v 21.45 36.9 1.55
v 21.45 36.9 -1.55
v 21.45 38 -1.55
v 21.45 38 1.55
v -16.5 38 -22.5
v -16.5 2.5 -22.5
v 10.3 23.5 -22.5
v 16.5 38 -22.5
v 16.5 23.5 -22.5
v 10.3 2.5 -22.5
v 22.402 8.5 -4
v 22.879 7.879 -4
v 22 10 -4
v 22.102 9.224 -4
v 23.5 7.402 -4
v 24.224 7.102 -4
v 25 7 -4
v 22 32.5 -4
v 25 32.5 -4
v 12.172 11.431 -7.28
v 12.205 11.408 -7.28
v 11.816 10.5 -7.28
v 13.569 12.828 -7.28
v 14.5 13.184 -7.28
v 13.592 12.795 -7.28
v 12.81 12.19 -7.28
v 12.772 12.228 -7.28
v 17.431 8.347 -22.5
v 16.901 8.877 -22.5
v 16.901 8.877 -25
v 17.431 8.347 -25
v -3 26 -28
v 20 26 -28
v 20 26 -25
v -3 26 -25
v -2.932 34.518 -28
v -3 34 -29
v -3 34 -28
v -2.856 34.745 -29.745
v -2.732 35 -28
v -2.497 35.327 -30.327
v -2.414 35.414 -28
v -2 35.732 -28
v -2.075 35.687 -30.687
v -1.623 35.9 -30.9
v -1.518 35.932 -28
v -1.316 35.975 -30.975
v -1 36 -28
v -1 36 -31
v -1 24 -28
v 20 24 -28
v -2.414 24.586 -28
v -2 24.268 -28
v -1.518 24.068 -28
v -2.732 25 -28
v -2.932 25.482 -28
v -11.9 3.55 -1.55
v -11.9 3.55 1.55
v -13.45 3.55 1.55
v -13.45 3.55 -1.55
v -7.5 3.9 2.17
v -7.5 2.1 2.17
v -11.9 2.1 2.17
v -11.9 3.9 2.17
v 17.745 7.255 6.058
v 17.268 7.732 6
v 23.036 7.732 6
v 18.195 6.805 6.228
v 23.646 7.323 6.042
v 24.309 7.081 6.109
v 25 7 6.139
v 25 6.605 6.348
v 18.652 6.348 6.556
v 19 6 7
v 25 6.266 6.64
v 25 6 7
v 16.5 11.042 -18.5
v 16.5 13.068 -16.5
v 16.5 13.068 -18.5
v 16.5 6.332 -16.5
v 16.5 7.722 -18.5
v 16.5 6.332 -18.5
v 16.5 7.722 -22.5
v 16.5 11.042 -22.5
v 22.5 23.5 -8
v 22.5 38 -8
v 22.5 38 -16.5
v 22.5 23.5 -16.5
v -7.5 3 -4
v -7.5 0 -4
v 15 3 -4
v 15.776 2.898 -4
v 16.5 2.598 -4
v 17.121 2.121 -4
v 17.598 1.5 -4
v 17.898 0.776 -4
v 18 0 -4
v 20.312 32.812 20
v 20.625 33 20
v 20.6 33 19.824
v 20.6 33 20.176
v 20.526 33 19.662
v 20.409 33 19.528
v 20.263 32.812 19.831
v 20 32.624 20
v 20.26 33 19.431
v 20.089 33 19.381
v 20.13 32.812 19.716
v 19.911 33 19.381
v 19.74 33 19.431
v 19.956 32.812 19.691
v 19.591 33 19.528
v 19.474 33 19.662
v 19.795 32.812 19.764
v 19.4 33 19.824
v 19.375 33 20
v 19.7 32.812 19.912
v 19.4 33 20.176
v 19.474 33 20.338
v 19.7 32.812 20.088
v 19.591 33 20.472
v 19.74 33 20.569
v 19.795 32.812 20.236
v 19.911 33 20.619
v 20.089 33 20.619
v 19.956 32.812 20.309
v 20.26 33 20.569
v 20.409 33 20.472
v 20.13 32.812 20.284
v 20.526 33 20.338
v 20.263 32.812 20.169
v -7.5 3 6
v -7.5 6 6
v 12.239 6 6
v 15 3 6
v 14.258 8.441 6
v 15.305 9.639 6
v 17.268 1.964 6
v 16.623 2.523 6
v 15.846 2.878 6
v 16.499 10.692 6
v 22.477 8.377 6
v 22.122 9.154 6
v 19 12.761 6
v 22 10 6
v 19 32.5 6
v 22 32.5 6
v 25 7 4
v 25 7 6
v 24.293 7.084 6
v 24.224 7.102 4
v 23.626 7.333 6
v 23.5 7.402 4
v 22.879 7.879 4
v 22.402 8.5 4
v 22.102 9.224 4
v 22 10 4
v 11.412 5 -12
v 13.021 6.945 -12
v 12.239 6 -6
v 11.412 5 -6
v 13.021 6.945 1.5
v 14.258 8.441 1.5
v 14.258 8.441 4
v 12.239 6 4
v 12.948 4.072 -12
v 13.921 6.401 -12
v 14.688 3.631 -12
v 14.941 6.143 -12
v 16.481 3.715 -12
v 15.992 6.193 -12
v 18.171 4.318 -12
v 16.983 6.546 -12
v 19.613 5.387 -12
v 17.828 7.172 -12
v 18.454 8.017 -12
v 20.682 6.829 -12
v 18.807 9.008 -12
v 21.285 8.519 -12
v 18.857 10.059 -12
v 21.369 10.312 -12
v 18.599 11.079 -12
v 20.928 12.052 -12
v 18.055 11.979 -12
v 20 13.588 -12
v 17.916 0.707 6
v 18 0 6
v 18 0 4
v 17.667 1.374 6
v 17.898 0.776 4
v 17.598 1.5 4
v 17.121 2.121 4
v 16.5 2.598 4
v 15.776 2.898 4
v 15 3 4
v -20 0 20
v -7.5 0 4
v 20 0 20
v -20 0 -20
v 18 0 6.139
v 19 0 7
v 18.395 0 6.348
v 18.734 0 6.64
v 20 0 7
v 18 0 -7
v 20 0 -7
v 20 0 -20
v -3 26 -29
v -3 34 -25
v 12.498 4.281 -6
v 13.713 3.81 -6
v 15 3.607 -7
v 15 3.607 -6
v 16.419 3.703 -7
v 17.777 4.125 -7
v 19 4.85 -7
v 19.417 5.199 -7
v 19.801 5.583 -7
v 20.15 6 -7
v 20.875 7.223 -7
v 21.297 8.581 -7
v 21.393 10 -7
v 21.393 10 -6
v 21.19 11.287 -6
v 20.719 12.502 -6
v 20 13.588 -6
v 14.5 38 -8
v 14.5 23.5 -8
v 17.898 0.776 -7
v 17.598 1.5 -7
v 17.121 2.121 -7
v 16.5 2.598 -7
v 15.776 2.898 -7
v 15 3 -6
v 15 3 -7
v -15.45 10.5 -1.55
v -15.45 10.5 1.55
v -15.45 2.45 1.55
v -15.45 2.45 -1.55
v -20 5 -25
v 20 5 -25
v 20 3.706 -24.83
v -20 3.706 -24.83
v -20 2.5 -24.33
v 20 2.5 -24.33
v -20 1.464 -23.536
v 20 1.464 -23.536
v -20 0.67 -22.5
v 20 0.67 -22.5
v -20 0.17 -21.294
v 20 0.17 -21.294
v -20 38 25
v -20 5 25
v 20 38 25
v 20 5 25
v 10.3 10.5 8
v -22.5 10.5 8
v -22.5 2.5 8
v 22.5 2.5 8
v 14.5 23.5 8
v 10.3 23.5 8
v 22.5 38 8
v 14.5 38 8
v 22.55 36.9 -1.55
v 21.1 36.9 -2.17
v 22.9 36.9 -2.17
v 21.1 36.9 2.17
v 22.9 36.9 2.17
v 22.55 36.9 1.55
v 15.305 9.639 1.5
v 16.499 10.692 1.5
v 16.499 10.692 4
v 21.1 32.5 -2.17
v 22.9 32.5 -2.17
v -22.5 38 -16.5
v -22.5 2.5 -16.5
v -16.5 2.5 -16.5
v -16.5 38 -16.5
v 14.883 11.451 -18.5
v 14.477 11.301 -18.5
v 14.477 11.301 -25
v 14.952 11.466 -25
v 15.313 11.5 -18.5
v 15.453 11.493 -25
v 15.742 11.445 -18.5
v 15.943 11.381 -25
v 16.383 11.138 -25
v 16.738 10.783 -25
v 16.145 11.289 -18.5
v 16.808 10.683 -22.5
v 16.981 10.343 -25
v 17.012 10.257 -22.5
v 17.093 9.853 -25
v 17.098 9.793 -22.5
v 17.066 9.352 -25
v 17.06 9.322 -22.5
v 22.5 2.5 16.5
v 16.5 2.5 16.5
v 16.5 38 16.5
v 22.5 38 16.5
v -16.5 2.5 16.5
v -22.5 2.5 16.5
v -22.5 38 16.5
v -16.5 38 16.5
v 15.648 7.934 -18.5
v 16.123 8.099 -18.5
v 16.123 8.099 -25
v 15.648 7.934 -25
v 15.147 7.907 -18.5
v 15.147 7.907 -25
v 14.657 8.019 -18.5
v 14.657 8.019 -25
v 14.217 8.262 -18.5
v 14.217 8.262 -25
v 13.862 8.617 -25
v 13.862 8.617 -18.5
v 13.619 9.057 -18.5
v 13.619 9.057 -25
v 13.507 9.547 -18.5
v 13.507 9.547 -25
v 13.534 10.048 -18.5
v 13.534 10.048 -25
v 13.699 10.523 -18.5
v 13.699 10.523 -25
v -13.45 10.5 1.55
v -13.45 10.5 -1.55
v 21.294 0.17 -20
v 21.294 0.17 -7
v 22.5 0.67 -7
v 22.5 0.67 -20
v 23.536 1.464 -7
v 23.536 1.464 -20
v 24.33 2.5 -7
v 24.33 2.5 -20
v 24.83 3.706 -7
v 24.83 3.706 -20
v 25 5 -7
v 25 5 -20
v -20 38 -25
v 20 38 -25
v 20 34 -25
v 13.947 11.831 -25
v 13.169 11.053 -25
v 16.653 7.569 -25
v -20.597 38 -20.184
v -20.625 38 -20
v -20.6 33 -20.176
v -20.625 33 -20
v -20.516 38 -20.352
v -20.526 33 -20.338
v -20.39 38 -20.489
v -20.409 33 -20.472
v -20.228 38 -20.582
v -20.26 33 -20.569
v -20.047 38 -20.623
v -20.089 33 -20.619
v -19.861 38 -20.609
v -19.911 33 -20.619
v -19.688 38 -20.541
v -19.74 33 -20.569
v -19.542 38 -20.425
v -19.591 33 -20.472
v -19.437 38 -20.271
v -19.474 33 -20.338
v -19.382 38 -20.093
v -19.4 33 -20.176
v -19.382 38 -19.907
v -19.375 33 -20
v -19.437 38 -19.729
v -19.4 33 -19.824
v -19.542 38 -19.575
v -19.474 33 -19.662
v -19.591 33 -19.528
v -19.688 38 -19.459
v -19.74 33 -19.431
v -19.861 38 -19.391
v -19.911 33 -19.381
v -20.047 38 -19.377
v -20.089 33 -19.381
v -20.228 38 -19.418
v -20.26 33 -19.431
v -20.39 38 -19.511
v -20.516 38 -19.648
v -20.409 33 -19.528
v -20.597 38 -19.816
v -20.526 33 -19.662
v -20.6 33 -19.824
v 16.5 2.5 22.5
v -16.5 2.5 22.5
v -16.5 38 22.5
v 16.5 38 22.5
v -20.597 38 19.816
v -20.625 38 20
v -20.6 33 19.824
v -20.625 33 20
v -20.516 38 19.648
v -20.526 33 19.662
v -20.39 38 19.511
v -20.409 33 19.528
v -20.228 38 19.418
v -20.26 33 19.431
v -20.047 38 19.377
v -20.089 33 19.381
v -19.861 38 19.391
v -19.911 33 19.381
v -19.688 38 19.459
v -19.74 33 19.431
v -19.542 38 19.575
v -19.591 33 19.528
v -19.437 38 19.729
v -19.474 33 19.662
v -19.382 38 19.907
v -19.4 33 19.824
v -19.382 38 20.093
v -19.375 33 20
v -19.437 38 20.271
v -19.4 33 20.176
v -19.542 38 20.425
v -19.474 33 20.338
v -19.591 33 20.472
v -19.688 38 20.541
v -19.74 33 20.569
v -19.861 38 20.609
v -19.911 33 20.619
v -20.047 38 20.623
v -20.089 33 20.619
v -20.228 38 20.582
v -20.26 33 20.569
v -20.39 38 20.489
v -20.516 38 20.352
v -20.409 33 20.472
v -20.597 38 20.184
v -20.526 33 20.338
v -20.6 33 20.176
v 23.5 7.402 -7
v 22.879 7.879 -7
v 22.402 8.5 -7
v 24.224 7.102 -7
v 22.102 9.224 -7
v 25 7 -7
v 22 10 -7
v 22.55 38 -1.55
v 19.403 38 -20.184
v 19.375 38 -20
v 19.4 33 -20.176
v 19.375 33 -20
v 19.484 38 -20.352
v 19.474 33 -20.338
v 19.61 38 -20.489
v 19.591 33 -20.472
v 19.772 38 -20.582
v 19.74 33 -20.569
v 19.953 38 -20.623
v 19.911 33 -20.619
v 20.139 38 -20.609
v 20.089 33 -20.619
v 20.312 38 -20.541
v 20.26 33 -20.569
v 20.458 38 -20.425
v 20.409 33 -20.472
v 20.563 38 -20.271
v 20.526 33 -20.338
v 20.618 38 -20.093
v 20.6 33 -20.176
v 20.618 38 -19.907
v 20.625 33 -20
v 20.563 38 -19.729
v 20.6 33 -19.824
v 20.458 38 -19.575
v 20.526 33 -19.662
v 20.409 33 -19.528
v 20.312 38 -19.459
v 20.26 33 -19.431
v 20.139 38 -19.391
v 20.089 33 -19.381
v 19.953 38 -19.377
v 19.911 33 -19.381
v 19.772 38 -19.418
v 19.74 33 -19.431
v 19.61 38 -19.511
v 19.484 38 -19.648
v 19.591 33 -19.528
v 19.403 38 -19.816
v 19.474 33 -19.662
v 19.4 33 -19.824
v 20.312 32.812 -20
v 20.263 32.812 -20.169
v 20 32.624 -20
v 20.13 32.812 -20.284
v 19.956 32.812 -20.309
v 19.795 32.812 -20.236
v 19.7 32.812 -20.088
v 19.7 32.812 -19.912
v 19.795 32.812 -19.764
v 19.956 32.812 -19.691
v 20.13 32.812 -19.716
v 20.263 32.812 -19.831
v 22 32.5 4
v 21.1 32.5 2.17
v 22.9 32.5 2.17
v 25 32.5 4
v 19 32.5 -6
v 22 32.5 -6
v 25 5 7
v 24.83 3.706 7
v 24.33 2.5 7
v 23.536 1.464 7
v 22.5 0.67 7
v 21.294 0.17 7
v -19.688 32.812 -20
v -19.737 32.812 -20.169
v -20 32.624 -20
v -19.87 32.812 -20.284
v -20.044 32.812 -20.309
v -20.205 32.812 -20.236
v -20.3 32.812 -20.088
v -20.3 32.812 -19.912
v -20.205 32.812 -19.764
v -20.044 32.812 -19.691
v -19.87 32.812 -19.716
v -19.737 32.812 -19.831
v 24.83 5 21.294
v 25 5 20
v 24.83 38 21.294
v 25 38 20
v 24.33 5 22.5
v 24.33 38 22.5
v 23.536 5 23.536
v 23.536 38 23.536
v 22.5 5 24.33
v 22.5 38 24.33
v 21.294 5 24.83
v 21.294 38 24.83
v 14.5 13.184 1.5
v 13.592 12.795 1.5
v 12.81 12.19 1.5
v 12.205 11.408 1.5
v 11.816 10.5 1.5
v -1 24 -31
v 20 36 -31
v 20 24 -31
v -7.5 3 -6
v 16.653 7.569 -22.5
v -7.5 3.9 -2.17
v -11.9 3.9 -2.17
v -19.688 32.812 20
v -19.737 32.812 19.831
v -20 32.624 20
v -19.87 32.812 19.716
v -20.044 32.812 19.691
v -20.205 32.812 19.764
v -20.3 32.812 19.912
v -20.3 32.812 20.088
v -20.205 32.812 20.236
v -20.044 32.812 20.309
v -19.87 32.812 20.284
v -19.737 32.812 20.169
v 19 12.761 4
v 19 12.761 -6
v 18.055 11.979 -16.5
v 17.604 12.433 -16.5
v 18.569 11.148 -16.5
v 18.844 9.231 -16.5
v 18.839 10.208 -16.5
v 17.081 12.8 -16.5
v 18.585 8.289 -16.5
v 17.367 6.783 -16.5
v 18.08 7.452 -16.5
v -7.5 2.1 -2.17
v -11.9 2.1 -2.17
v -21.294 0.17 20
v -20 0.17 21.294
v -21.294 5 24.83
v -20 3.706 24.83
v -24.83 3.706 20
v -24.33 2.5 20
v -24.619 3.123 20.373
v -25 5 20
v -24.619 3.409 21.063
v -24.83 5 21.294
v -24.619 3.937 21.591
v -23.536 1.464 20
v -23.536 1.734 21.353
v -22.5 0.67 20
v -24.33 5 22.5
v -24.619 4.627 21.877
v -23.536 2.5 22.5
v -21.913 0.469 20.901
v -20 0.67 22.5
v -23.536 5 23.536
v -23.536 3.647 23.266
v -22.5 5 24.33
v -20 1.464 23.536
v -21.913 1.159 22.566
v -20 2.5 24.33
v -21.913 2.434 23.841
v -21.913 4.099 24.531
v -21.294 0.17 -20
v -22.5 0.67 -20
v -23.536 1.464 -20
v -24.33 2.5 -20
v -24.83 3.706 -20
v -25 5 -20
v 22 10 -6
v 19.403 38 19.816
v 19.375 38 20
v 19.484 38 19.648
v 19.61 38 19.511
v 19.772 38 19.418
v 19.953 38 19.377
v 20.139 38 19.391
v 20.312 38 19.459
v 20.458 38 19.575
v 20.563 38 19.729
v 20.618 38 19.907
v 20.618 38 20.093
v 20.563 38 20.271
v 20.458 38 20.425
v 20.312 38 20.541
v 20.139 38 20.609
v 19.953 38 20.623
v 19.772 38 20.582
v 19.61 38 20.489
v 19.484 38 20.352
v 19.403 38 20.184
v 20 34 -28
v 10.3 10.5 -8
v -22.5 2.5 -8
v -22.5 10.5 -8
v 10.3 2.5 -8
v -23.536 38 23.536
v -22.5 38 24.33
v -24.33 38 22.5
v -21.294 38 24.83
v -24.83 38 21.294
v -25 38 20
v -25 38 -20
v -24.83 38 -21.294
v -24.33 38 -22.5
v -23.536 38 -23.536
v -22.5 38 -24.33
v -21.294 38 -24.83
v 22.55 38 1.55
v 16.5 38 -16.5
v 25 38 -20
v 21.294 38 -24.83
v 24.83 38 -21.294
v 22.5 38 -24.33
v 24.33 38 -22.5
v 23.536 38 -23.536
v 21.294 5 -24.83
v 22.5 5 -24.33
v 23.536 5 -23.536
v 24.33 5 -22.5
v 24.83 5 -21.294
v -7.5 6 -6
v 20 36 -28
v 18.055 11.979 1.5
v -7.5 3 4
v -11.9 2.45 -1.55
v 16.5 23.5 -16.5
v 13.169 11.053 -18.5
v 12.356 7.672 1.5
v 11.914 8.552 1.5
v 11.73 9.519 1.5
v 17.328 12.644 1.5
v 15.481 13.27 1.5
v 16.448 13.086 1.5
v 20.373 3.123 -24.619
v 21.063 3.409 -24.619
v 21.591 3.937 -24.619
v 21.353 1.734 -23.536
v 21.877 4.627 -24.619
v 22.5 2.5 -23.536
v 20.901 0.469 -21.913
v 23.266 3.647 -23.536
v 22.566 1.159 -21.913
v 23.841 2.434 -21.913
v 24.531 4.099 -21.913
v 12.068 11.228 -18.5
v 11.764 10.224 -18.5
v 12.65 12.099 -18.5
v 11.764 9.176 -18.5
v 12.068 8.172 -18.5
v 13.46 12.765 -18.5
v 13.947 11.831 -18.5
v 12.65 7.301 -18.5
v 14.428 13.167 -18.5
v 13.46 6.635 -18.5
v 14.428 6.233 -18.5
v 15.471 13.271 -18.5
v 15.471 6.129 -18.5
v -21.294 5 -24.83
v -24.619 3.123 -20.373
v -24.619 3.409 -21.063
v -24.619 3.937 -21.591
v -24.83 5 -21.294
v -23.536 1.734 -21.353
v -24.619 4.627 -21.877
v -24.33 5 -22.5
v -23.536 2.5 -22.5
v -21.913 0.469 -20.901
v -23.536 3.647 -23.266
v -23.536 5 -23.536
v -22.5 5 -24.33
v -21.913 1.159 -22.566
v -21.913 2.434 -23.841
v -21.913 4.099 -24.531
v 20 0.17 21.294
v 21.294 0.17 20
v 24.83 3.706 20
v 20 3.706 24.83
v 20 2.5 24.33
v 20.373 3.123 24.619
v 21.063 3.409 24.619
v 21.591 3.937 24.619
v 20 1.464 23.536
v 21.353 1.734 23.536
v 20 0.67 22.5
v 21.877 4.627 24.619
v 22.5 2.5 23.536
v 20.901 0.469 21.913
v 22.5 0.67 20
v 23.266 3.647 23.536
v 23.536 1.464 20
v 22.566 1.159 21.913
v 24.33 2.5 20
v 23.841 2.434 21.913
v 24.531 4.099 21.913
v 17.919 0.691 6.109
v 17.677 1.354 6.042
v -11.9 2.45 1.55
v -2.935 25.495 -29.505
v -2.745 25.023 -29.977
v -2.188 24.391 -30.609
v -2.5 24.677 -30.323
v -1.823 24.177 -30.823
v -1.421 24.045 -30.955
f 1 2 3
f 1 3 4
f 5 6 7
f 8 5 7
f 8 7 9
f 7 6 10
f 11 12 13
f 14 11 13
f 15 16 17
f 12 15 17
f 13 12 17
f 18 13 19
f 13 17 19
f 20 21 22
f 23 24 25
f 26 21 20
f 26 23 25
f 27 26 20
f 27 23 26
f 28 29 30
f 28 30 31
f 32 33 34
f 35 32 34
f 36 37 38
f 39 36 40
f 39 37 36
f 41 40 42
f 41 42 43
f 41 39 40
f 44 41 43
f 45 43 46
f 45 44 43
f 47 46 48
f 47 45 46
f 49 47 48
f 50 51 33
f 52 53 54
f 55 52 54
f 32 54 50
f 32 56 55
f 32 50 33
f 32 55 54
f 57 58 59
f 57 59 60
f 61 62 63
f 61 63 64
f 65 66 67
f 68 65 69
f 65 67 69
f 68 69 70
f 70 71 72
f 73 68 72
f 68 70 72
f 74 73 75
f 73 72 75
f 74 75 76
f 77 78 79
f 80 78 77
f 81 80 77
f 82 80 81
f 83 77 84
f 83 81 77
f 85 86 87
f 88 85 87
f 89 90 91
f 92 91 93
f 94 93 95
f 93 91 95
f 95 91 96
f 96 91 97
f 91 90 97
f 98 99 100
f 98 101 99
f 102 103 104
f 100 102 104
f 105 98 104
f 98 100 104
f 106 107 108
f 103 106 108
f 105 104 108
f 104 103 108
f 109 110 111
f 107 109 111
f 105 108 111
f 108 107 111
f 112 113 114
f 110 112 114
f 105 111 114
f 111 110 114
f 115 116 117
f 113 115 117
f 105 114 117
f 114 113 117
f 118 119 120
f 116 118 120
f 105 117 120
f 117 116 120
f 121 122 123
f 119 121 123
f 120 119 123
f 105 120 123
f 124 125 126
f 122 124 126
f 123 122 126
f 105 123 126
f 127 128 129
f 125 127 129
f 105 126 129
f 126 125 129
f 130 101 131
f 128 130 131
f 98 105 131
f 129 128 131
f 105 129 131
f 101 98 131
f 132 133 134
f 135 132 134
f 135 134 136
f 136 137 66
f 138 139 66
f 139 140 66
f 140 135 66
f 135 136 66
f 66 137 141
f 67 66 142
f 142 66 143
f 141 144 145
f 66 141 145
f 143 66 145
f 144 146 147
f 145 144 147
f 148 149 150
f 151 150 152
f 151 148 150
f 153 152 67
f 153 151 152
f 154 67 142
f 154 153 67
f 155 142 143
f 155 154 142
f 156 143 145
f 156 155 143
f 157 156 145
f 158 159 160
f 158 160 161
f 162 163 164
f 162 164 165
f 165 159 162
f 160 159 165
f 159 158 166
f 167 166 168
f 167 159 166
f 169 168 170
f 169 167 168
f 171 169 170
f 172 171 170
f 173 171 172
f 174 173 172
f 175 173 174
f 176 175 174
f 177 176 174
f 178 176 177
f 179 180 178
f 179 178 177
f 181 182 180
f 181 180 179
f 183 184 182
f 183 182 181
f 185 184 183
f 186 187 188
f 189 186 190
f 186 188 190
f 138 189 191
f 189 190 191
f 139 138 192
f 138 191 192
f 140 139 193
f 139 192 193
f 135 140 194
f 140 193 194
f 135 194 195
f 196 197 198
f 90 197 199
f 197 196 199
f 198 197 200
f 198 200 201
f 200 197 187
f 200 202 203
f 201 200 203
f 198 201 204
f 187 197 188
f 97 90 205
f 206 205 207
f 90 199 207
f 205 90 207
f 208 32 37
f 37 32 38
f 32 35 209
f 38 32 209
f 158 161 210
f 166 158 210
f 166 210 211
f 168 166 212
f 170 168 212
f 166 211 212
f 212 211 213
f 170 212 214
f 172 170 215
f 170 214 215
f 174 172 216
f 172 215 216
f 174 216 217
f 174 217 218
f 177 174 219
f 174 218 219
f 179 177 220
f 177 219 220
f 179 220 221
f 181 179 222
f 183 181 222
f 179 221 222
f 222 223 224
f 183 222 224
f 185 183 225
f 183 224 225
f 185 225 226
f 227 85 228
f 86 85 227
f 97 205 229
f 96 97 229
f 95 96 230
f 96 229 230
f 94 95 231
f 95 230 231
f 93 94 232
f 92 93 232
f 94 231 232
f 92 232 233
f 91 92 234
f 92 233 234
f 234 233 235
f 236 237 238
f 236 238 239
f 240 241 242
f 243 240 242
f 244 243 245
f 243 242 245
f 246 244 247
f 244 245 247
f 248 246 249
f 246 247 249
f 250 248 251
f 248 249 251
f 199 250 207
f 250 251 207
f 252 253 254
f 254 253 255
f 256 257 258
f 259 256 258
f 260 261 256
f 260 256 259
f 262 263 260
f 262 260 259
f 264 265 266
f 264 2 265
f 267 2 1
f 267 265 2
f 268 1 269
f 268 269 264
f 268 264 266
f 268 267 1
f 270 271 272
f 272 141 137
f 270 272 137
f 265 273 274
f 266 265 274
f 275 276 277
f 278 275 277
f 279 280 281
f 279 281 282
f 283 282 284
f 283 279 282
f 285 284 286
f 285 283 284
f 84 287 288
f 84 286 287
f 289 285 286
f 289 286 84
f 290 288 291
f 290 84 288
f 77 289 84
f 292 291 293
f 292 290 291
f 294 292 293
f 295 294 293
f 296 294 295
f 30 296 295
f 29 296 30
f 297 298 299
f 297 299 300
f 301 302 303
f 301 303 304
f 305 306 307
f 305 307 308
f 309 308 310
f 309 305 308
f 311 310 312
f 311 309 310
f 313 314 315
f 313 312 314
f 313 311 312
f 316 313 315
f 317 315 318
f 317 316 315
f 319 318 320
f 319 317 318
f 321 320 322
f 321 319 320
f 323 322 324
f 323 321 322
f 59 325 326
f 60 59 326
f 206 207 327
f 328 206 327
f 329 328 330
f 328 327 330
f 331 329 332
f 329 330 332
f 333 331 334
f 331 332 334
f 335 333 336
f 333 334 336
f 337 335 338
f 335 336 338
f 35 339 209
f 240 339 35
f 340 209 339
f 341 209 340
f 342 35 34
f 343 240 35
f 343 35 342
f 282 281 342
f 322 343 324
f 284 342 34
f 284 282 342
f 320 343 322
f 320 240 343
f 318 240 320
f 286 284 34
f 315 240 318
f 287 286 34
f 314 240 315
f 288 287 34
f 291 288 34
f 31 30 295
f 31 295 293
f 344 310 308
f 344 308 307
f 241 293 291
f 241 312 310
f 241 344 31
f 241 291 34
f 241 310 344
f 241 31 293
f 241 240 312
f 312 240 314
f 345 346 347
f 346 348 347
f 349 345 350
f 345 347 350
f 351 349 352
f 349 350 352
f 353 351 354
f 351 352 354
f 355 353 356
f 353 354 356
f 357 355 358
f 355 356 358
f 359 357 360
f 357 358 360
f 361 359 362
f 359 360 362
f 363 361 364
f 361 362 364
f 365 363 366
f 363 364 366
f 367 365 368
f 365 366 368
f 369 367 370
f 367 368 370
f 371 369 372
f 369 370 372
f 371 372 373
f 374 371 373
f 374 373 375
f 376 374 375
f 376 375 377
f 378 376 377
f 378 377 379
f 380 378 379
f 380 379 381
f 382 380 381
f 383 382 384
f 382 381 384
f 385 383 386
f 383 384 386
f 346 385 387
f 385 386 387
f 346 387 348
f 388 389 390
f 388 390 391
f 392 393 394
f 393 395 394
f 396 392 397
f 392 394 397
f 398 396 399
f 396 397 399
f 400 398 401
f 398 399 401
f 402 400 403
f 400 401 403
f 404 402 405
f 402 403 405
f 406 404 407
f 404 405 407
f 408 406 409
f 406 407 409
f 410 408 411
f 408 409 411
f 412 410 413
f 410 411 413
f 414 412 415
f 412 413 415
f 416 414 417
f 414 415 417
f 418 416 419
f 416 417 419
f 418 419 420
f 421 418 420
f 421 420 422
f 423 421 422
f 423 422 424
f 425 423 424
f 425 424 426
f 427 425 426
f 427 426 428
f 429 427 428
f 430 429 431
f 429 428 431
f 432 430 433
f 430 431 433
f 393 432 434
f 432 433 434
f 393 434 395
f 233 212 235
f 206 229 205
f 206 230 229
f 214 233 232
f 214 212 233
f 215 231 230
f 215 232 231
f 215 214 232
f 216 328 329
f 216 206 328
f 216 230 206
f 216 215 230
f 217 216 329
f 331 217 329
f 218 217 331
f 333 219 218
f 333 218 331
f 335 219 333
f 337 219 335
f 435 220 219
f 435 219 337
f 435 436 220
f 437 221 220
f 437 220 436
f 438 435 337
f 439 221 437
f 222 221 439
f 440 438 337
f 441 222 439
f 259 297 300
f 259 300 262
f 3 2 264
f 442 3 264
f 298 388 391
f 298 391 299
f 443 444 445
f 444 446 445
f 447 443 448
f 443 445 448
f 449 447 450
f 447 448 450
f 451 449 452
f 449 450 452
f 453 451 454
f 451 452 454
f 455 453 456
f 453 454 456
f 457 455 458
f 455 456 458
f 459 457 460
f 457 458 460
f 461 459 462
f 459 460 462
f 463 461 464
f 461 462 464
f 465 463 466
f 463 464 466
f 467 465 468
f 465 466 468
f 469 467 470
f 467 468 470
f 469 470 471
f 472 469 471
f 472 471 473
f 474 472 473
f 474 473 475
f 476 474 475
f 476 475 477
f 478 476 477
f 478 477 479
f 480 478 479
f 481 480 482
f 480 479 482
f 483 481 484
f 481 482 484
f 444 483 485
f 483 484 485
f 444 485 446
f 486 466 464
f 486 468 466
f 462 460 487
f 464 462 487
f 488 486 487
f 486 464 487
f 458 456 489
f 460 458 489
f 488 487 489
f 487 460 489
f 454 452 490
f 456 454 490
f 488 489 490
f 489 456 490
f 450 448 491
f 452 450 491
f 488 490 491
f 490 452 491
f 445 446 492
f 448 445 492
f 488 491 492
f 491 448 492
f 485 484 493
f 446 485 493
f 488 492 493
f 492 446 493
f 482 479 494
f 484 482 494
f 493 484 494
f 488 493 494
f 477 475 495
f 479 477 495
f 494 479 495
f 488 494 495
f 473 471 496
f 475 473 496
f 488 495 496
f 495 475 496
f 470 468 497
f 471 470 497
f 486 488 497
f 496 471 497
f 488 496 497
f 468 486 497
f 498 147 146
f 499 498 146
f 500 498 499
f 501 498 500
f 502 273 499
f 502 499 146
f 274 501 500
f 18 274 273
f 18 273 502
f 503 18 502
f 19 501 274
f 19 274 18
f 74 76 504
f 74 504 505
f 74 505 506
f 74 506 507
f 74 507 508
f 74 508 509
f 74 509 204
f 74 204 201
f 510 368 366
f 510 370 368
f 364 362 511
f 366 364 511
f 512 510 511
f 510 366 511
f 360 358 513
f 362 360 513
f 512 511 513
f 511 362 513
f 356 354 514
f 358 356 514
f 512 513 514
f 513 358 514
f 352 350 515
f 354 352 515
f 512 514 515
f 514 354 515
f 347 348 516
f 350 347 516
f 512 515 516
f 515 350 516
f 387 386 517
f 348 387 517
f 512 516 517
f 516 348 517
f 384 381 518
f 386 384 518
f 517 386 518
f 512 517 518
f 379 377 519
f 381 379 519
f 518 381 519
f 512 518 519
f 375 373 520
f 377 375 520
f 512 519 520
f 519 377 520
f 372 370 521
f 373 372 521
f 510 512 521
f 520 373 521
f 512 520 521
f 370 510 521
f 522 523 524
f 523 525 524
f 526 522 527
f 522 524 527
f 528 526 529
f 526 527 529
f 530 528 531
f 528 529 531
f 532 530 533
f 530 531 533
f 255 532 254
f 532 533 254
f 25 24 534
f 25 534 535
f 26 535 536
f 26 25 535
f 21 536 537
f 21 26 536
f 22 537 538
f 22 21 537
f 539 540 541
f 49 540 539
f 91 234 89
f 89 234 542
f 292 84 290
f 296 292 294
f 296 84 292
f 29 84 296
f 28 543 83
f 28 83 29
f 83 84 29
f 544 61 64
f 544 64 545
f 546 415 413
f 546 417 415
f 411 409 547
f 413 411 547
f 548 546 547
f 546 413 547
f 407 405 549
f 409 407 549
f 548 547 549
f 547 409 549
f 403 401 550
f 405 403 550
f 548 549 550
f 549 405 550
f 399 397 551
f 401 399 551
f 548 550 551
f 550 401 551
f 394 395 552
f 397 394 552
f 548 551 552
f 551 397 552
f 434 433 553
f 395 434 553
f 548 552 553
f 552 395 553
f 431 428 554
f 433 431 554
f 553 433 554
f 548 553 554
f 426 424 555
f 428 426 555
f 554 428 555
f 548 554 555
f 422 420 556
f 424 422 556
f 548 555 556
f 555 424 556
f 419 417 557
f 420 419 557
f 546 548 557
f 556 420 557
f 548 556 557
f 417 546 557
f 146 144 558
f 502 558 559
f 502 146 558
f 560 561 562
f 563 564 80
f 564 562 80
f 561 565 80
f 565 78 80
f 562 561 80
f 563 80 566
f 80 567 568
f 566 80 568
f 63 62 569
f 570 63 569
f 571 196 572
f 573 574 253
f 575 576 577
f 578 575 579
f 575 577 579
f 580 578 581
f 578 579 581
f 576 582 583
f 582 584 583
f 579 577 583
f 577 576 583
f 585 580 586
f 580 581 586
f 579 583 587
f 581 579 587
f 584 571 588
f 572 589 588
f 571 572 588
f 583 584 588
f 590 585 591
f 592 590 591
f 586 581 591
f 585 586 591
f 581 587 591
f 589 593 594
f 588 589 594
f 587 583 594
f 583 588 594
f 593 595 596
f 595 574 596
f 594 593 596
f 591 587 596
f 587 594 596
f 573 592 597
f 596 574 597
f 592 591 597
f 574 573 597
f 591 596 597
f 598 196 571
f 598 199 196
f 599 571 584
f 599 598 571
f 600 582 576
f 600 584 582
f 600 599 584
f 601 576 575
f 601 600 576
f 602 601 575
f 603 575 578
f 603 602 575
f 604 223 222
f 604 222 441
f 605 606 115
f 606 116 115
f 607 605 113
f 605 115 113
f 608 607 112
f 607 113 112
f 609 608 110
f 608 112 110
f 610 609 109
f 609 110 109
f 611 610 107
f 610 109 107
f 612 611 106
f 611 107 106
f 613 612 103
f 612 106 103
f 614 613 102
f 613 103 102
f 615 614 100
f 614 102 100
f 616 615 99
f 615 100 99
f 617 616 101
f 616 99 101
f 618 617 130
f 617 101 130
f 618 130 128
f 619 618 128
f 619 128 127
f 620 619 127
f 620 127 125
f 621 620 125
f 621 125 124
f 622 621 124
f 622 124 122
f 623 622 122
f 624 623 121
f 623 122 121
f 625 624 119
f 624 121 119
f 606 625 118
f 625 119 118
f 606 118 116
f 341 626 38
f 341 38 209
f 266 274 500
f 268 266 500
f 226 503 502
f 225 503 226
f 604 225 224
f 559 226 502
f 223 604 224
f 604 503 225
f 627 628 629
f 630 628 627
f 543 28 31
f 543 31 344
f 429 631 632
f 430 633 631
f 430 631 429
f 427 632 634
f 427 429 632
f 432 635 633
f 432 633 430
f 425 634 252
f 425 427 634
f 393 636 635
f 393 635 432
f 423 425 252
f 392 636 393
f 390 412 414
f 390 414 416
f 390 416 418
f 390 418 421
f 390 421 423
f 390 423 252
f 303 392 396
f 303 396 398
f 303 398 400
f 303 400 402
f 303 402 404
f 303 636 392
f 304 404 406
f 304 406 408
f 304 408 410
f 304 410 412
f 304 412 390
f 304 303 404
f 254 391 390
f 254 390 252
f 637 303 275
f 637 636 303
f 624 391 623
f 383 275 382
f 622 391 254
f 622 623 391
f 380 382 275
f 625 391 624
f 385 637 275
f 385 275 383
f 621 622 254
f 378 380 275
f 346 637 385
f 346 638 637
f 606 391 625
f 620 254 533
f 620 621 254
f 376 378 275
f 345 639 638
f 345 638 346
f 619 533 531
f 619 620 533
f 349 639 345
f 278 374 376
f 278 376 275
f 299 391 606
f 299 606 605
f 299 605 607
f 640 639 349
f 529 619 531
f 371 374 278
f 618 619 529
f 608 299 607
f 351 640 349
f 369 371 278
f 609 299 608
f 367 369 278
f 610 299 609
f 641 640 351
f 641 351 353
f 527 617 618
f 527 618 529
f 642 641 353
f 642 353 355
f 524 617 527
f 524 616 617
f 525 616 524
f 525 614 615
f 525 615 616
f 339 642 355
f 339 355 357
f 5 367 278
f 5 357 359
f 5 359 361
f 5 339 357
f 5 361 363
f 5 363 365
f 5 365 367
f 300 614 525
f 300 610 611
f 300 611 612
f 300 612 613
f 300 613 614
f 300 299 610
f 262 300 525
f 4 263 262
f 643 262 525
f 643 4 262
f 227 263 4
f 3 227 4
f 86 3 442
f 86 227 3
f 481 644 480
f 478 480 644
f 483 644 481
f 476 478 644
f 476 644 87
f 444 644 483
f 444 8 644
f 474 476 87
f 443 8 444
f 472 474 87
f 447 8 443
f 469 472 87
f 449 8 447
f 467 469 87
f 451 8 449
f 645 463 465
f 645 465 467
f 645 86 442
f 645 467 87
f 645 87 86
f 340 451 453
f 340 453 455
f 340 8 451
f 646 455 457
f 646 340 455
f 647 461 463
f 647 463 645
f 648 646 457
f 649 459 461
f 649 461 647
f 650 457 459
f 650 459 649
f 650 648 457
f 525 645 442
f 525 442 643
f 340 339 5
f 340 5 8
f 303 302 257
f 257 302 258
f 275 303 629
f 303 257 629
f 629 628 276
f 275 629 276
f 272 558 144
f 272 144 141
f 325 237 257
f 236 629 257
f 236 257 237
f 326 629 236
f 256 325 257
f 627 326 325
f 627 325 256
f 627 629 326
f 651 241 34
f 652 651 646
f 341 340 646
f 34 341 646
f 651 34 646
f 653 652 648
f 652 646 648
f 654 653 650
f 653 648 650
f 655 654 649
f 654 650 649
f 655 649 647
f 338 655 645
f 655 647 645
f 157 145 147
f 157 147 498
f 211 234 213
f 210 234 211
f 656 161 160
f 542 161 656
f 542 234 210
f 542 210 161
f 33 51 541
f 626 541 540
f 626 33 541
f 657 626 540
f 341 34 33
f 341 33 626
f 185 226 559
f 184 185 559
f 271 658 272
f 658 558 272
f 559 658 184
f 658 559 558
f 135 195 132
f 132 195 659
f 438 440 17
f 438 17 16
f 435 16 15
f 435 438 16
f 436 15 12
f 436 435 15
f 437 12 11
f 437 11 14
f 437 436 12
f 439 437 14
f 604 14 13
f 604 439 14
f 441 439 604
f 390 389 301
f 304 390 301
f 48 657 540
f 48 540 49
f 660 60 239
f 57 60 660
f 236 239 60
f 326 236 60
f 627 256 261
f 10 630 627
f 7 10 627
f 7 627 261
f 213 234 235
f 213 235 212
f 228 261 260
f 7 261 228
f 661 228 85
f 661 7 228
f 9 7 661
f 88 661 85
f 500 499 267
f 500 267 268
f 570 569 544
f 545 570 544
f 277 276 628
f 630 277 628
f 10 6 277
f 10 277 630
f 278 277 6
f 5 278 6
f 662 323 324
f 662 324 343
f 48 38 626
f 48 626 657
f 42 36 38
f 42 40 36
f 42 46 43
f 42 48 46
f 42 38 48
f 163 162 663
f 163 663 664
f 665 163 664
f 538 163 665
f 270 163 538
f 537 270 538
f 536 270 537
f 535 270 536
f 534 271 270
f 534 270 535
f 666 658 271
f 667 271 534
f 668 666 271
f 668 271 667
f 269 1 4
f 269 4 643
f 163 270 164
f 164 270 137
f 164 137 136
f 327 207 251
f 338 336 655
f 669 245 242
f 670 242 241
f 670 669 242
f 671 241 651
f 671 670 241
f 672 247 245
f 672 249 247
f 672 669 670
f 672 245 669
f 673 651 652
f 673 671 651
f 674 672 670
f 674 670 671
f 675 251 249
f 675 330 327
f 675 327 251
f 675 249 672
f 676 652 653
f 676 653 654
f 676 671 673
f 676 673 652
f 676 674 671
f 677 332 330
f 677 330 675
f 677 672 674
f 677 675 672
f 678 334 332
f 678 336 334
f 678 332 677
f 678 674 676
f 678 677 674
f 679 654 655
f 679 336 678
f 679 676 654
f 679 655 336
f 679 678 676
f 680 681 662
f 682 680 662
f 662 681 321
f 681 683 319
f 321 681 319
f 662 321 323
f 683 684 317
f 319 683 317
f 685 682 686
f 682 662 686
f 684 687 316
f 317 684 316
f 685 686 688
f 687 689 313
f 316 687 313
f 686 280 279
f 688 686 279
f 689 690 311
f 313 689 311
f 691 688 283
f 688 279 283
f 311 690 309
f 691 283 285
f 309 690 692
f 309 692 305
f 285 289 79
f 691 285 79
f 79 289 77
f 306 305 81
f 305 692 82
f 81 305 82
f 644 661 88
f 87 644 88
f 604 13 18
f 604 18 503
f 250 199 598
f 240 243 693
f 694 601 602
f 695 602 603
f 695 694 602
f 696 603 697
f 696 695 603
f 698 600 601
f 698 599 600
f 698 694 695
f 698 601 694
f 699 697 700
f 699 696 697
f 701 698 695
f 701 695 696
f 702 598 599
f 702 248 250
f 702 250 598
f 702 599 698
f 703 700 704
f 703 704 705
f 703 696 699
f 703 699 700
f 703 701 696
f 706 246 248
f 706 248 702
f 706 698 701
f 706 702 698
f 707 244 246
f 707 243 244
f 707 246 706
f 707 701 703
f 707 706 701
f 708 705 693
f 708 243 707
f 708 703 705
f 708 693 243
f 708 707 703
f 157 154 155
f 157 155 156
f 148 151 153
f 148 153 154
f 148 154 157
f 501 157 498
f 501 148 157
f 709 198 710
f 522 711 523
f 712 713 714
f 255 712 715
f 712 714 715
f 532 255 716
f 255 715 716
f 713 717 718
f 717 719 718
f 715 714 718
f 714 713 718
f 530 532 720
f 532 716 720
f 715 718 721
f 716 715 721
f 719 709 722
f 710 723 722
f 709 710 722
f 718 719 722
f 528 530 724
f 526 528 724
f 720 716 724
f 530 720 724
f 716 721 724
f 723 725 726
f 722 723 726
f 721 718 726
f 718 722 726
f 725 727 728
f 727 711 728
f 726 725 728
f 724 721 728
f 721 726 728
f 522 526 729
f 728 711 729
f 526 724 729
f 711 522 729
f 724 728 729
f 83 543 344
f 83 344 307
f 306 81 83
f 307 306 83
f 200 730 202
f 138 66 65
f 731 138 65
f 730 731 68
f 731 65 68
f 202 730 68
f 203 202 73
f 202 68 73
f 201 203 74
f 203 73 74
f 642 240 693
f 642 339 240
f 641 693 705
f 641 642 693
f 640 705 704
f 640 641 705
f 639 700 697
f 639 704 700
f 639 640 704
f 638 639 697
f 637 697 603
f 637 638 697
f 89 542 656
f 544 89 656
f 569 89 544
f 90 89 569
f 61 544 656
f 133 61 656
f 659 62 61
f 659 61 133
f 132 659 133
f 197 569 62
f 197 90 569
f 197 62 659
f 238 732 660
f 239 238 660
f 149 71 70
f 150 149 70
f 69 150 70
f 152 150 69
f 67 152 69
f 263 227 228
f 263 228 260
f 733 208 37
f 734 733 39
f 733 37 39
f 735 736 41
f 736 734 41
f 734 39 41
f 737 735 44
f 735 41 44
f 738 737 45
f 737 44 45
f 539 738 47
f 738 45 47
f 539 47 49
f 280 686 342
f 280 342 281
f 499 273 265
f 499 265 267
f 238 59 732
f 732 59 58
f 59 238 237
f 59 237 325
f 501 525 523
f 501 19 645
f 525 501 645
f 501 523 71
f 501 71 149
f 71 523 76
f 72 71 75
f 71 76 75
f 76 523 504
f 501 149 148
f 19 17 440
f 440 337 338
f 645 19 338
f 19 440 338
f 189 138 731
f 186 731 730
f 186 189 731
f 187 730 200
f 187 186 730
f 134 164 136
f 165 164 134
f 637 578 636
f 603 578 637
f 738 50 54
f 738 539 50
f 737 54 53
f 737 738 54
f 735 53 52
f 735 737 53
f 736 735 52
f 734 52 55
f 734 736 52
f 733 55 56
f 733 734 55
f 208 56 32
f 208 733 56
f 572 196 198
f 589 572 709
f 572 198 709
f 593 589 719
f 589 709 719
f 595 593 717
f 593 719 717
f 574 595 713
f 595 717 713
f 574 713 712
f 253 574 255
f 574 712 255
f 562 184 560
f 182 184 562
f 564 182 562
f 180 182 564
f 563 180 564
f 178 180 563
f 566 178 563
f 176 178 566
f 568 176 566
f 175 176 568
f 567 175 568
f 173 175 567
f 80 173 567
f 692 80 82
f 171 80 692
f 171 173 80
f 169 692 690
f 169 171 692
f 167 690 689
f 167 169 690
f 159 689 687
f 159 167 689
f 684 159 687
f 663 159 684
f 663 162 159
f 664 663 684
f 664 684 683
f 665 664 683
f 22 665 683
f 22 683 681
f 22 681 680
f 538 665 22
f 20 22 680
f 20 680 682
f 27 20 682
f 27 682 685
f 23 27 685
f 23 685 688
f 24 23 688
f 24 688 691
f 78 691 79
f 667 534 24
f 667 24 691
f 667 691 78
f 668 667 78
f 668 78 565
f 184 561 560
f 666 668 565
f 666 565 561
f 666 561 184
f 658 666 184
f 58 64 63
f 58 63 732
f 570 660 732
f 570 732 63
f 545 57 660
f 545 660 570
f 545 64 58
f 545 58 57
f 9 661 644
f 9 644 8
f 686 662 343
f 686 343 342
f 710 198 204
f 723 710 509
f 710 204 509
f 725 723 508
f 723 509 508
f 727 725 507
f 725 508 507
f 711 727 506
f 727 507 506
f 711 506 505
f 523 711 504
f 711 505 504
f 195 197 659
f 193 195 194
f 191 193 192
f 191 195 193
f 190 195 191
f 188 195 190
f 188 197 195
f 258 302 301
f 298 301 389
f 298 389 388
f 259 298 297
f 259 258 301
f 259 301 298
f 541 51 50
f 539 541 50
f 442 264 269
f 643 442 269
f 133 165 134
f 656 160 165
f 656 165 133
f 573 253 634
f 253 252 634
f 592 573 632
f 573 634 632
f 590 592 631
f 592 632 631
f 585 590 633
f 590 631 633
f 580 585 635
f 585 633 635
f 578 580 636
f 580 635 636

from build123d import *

# Parameters (mm, degrees)
SKETCH1_W                = 50
SKETCH1_H                = 50
BOSS_EXTRUDE1_DEPTH      = 38
SHELL1_T                 = -2.5
BOSS_EXTRUDE2_DEPTH      = 21
SKETCH3_W                = 45
SKETCH3_H                = 16
BOSS_EXTRUDE3_DEPTH      = 8
SKETCH4_W                = 32.5
SKETCH4_H                = 8
CUT_EXTRUDE1_DEPTH       = 3
SKETCH7_W                = 32.5
SKETCH7_H                = 12
CUT_EXTRUDE2_DEPTH       = 3
SKETCH8_W                = 16
SKETCH8_H                = 27.5
BOSS_EXTRUDE4_DEPTH      = 8
SKETCH9_W                = 8
SKETCH9_H                = 32.5
CUT_EXTRUDE3_DEPTH       = 3
CUT_EXTRUDE5_DEPTH       = 3
CUT_EXTRUDE7_DEPTH       = 10
CUT_EXTRUDE7_DEPTH_BACK  = 2
SKETCH13_W               = 3
SKETCH13_H               = 3.011524732
FILLET1_R                = 5
SKETCH16_R               = 1.8
CUT_EXTRUDE8_DEPTH       = 53.642663306
SKETCH17_W               = 23
SKETCH17_H               = 12
BOSS_EXTRUDE5_DEPTH      = 6
SKETCH18_W               = 3
SKETCH18_H               = 2
CUT_EXTRUDE9_DEPTH       = 57.471231614
CUT_EXTRUDE12_DEPTH      = 2
CUT_EXTRUDE13_DEPTH      = 2
CUT_EXTRUDE14_DEPTH      = 16
CUT_EXTRUDE10_START      = -19.5
CUT_EXTRUDE10_DEPTH      = 19.5
FILLET4_R                = 2
CUT_EXTRUDE18_DEPTH      = 13
CUT_EXTRUDE18_DEPTH_BACK = 1
SKETCH26_W               = 6
SKETCH26_H               = 6
BOSS_EXTRUDE6_DEPTH      = 4.5
SKETCH30_W               = 4.34
SKETCH30_H               = 1.8
CUT_EXTRUDE19_DEPTH      = 4.4
SKETCH31_W               = 1.8
SKETCH31_H               = 4.34
CUT_EXTRUDE20_DEPTH      = 4.4
SKETCH32_W               = 1.1
SKETCH32_H               = 3.1
CUT_EXTRUDE21_DEPTH      = 55.291896265
SKETCH33_W               = 3.1
SKETCH33_H               = 1.1
CUT_EXTRUDE22_DEPTH      = 3.55
SKETCH34_W               = 2
SKETCH34_H               = 3.1
CUT_EXTRUDE23_DEPTH      = 7.3
SKETCH45_R               = 3.575
CUT_EXTRUDE27_DEPTH      = 20
SKETCH46_W               = 1.850257739
SKETCH46_H               = 4
SKETCH46_W_2             = 4
SKETCH46_H_2             = 1.850257739
CUT_EXTRUDE28_DEPTH      = 1
CUT_EXTRUDE25_START      = -3
CUT_EXTRUDE25_DEPTH      = 3
CUT_EXTRUDE24_START      = -3
CUT_EXTRUDE24_DEPTH      = 3
CUT_EXTRUDE29_DEPTH      = 2
FILLET8_R                = 2
BOSS_EXTRUDE9_DEPTH      = 8.78
SKETCH49_W               = 4.2
SKETCH49_H               = 13
BOSS_EXTRUDE10_DEPTH     = 6.5
SKETCH50_W               = 6
SKETCH50_H               = 6
BOSS_EXTRUDE11_DEPTH     = 35.5
M1_6_TAPPED_HOLE1_D      = 1.25
M1_6_TAPPED_HOLE1_DEPTH  = 5
M1_6_TAPPED_HOLE1_TIP    = 0.375537887


with BuildPart() as part:
    # Sketch1 → Boss-Extrude1 (new body)
    with BuildSketch(Plane(origin=(0, 0, 0), x_dir=(1, 0, 0), z_dir=(0, 1, 0))):
        Rectangle(SKETCH1_W, SKETCH1_H)
    extrude(amount=BOSS_EXTRUDE1_DEPTH)

    # Shell1
    shell1_openings = [part.faces().sort_by_distance(p)[0] for p in [
        (0, 38, 0),
    ]]
    offset(amount=SHELL1_T, openings=shell1_openings, kind=Kind.INTERSECTION)

    # Sketch2 → Boss-Extrude2 (add)
    with BuildSketch(Plane(origin=(0, 2.5, 0), x_dir=(1, 0, 0), z_dir=(0, 1, 0))):
        Polygon((10.3, 22.5), (10.3, 13.5), (10.3, 7.28), (22.5, 7.28), (22.5, 22.5), align=None)
    extrude(amount=BOSS_EXTRUDE2_DEPTH)

    # Sketch3 → Boss-Extrude3 (add)
    with BuildSketch(Plane(origin=(0, 2.5, 0), x_dir=(1, 0, 0), z_dir=(0, 1, 0))):
        Rectangle(SKETCH3_W, SKETCH3_H)
    extrude(amount=BOSS_EXTRUDE3_DEPTH)

    # Sketch4 → Cut-Extrude1 (cut)
    with BuildSketch(Plane.XZ):
        with Locations((8.75, 0)):
            Rectangle(SKETCH4_W, SKETCH4_H)
    extrude(amount=-CUT_EXTRUDE1_DEPTH, mode=Mode.SUBTRACT)

    # Sketch7 → Cut-Extrude2 (cut)
    with BuildSketch(Plane(origin=(0, 3, 0), x_dir=(-1, 0, 0), z_dir=(0, -1, 0))):
        with Locations((-8.75, 0)):
            Rectangle(SKETCH7_W, SKETCH7_H)
    extrude(amount=-CUT_EXTRUDE2_DEPTH, mode=Mode.SUBTRACT)

    # Sketch8 → Boss-Extrude4 (add)
    with BuildSketch(Plane.ZY.offset(-22.5)):
        with Locations((0, 24.25)):
            Rectangle(SKETCH8_W, SKETCH8_H)
    extrude(amount=BOSS_EXTRUDE4_DEPTH)

    # Sketch9 → Cut-Extrude3 (cut)
    with BuildSketch(Plane(origin=(25, 0, 0), x_dir=(0, 0, -1), z_dir=(1, 0, 0))):
        with Locations((0, 16.25)):
            Rectangle(SKETCH9_W, SKETCH9_H)
    extrude(amount=-CUT_EXTRUDE3_DEPTH, mode=Mode.SUBTRACT)

    # Sketch10 → Cut-Extrude5 (cut)
    with BuildSketch(Plane(origin=(22, 0, 0), x_dir=(0, 0, -1), z_dir=(1, 0, 0))):
        Polygon((-6, 32.5), (-6, 0), (6, 0), (6, 3), (6, 32.5), align=None)
    extrude(amount=-CUT_EXTRUDE5_DEPTH, mode=Mode.SUBTRACT)

    # Sketch13 → Cut-Extrude7 (cut, two sides: drawn at the far end of the back side and taken through both)
    with BuildSketch(Plane(origin=(0, 0, 4), x_dir=(-1, 0, 0), z_dir=(0, 0, -1)).offset(-CUT_EXTRUDE7_DEPTH_BACK)):
        with Locations((-23.5, 1.505762366)):
            Rectangle(SKETCH13_W, SKETCH13_H)
    extrude(amount=CUT_EXTRUDE7_DEPTH + CUT_EXTRUDE7_DEPTH_BACK, mode=Mode.SUBTRACT)

    # Fillet1
    fillet1_edges = [part.edges().sort_by_distance(p)[0] for p in [
        (25, 0, -15.5),
        (0, 0, -25),
        (25, 0, 15.5),
        (0, 0, 25),
        (-25, 0, 0),
        (-25, 19, -25),
        (25, 19, -25),
        (25, 19, 25),
        (-25, 19, 25),
    ]]
    fillet(fillet1_edges, radius=FILLET1_R)

    # Sketch16 → Cut-Extrude8 (cut, through all)
    with BuildSketch(Plane(origin=(0, 0, 1.5), x_dir=(-1, 0, 0), z_dir=(0, 0, -1))):
        with Locations(Location((-15.3, 9.7, 0), (0, 0, 63.612200039))):
            Circle(SKETCH16_R)
    extrude(amount=CUT_EXTRUDE8_DEPTH, mode=Mode.SUBTRACT)

    # Sketch17 → Boss-Extrude5 (add)
    with BuildSketch(Plane(origin=(0, 0, -25), x_dir=(-1, 0, 0), z_dir=(0, 0, -1))):
        with Locations((-8.5, 30)):
            Rectangle(SKETCH17_W, SKETCH17_H)
    extrude(amount=BOSS_EXTRUDE5_DEPTH)

    # Sketch18 → Cut-Extrude9 (cut, through all)
    with BuildSketch(Plane.ZY.offset(3)):
        with Locations((-26.5, 25)):
            Rectangle(SKETCH18_W, SKETCH18_H)
        with Locations((-26.5, 35)):
            Rectangle(SKETCH18_W, SKETCH18_H)
    extrude(amount=-CUT_EXTRUDE9_DEPTH, mode=Mode.SUBTRACT)

    # Sketch20 → Cut-Extrude12 (cut)
    with BuildSketch(Plane(origin=(0, 0, 4), x_dir=(-1, 0, 0), z_dir=(0, 0, -1))):
        with BuildLine():
            Line((-22, 10), (-22, 7))
            Line((-22, 7), (-22, 6))
            Line((-22, 6), (-24, 6))
            Line((-24, 6), (-25, 6))
            Line((-25, 6), (-25, 7))
            ThreePointArc((-25, 7), (-22.878679656, 7.878679656), (-22, 10))
        make_face()
    extrude(amount=-CUT_EXTRUDE12_DEPTH, mode=Mode.SUBTRACT)

    # Sketch21 → Cut-Extrude13 (cut)
    with BuildSketch(Plane(origin=(0, 0, 4), x_dir=(-1, 0, 0), z_dir=(0, 0, -1))):
        with BuildLine():
            Line((-19, 3), (-19, 0))
            Line((-19, 0), (-18, 0))
            ThreePointArc((-18, 0), (-17.121320344, 2.121320344), (-15, 3))
            Line((-15, 3), (-19, 3))
        make_face()
    extrude(amount=-CUT_EXTRUDE13_DEPTH, mode=Mode.SUBTRACT)

    # Sketch22 → Cut-Extrude14 (cut)
    with BuildSketch(Plane(origin=(0, 0, 4), x_dir=(-1, 0, 0), z_dir=(0, 0, -1))):
        with BuildLine():
            Line((-15.3, 9.7), (-11.411555581, 5))
            ThreePointArc((-11.411555581, 5), (-19.613351365, 5.386648635), (-20, 13.588444419))
            Line((-20, 13.588444419), (-15.3, 9.7))
        make_face()
    extrude(amount=CUT_EXTRUDE14_DEPTH, mode=Mode.SUBTRACT)

    # Sketch19 → Cut-Extrude10 (cut)
    with BuildSketch(Plane(origin=(0, 0, -25), x_dir=(-1, 0, 0), z_dir=(0, 0, -1)).offset(CUT_EXTRUDE10_START)):
        with BuildLine():
            ThreePointArc((-16.123011235, 8.099171306), (-16.572792206, 8.427207794), (-16.900828694, 8.876988765))
            Line((-16.900828694, 8.876988765), (-17.43115878, 8.346658679))
            Line((-17.43115878, 8.346658679), (-16.653341321, 7.56884122))
            Line((-16.653341321, 7.56884122), (-16.123011235, 8.099171306))
        make_face()
        with BuildLine():
            ThreePointArc((-14.476988765, 11.300828694), (-14.027207794, 10.972792206), (-13.699171306, 10.523011235))
            Line((-13.699171306, 10.523011235), (-13.16884122, 11.053341321))
            Line((-13.16884122, 11.053341321), (-13.946658679, 11.83115878))
            Line((-13.946658679, 11.83115878), (-14.476988765, 11.300828694))
        make_face()
    extrude(amount=CUT_EXTRUDE10_DEPTH, mode=Mode.SUBTRACT)

    # Fillet4
    fillet4_edges = [part.edges().sort_by_distance(p)[0] for p in [
        (-3, 36, -29.5),
        (-3, 24, -29.5),
        (-3, 30, -31),
    ]]
    fillet(fillet4_edges, radius=FILLET4_R)

    # Sketch26 → Cut-Extrude18 (cut, two sides: drawn at the far end of the back side and taken through both)
    with BuildSketch(Plane(origin=(0, 0, 6), x_dir=(-1, 0, 0), z_dir=(0, 0, -1)).offset(-CUT_EXTRUDE18_DEPTH_BACK)):
        with Locations((-22, 3)):
            Rectangle(SKETCH26_W, SKETCH26_H)
    extrude(amount=CUT_EXTRUDE18_DEPTH + CUT_EXTRUDE18_DEPTH_BACK, mode=Mode.SUBTRACT)

    # Sketch29 → Boss-Extrude6 (add)
    with BuildSketch(Plane(origin=(0, 0, 6), x_dir=(-1, 0, 0), z_dir=(0, 0, -1))):
        with BuildLine():
            Line((-16.499079266, 10.69203257), (-15.305377807, 9.639286837))
            Line((-15.305377807, 9.639286837), (-14.258167132, 8.440726637))
            ThreePointArc((-14.258167132, 8.440726637), (-14.177344347, 10.762112408), (-16.499079266, 10.69203257))
        make_face()
    extrude(amount=BOSS_EXTRUDE6_DEPTH)

    # Sketch30 → Cut-Extrude19 (cut)
    with BuildSketch(Plane(origin=(-7.5, 0, 0), x_dir=(0, 0, -1), z_dir=(1, 0, 0))):
        with Locations((0, 3)):
            Rectangle(SKETCH30_W, SKETCH30_H)
    extrude(amount=-CUT_EXTRUDE19_DEPTH, mode=Mode.SUBTRACT)

    # Sketch31 → Cut-Extrude20 (cut)
    with BuildSketch(Plane.XZ.offset(-32.5)):
        with Locations((22, 0)):
            Rectangle(SKETCH31_W, SKETCH31_H)
    extrude(amount=-CUT_EXTRUDE20_DEPTH, mode=Mode.SUBTRACT)

    # Sketch32 → Cut-Extrude21 (cut, through all)
    with BuildSketch(Plane.XZ.offset(-36.9)):
        with Locations((22, 0)):
            Rectangle(SKETCH32_W, SKETCH32_H)
    extrude(amount=-CUT_EXTRUDE21_DEPTH, mode=Mode.SUBTRACT)

    # Sketch33 → Cut-Extrude22 (cut)
    with BuildSketch(Plane(origin=(-11.9, 0, 0), x_dir=(0, 0, -1), z_dir=(1, 0, 0))):
        with Locations((0, 3)):
            Rectangle(SKETCH33_W, SKETCH33_H)
    extrude(amount=-CUT_EXTRUDE22_DEPTH, mode=Mode.SUBTRACT)

    # Sketch34 → Cut-Extrude23 (cut)
    with BuildSketch(Plane(origin=(0, 10.5, 0), x_dir=(1, 0, 0), z_dir=(0, 1, 0))):
        with Locations((-14.45, 0)):
            Rectangle(SKETCH34_W, SKETCH34_H)
    extrude(amount=-CUT_EXTRUDE23_DEPTH, mode=Mode.SUBTRACT)

    # Sketch45 → Cut-Extrude27 (cut)
    with BuildSketch(Plane(origin=(0, 0, 1.5), x_dir=(-1, 0, 0), z_dir=(0, 0, -1))):
        with Locations(Location((-15.3, 9.7, 0), (0, 0, 140.398072919))):
            Circle(SKETCH45_R)
    extrude(amount=CUT_EXTRUDE27_DEPTH, mode=Mode.SUBTRACT)

    # Sketch46 → Cut-Extrude28 (cut)
    with BuildSketch(Plane.XY.offset(-6)):
        with Locations((21.074871131, 8)):
            Rectangle(SKETCH46_W, SKETCH46_H)
        with Locations((17, 3.925128869)):
            Rectangle(SKETCH46_W_2, SKETCH46_H_2)
    extrude(amount=-CUT_EXTRUDE28_DEPTH, mode=Mode.SUBTRACT)

    # Sketch43 → Cut-Extrude25 (cut)
    with BuildSketch(Plane.XY.offset(-4).offset(CUT_EXTRUDE25_START)):
        with BuildLine():
            Line((19, 0), (18, 0))
            ThreePointArc((18, 0), (17.121320344, 2.121320344), (15, 3))
            Line((15, 3), (19, 3))
            Line((19, 3), (19, 0))
        make_face()
    extrude(amount=CUT_EXTRUDE25_DEPTH, mode=Mode.SUBTRACT)

    # Sketch42 → Cut-Extrude24 (cut)
    with BuildSketch(Plane.XY.offset(-4).offset(CUT_EXTRUDE24_START)):
        with BuildLine():
            Line((22, 6), (25, 6))
            Line((25, 6), (25, 7))
            ThreePointArc((25, 7), (22.878679656, 7.878679656), (22, 10))
            Line((22, 10), (22, 6))
        make_face()
    extrude(amount=CUT_EXTRUDE24_DEPTH, mode=Mode.SUBTRACT)

    # Sketch47 → Cut-Extrude29 (cut)
    with BuildSketch(Plane(origin=(0, 0, 4), x_dir=(-1, 0, 0), z_dir=(0, 0, -1))):
        Polygon((-19, 12.761115819), (-16.499079266, 10.69203257), (-15.305377807, 9.639286837), (-14.258167132, 8.440726637), (-12.238884181, 6), (-19, 6), align=None)
    extrude(amount=-CUT_EXTRUDE29_DEPTH, mode=Mode.SUBTRACT)

    # Fillet8
    # the kernel refuses this fillet: 2 mm, written as the material it takes off along each edge
    with BuildSketch(Plane(origin=(19, 6, 6), x_dir=(-1, 0, 0), z_dir=(0, -1, 0))) as fillet8_piece_1_section:
        with BuildLine():
            CenterArc((1.732050808, -2), FILLET8_R, 90, 60)
            Line((0, -1), (0, 0))
            Line((0, 0), (1.732050808, 0))
        make_face()
    fillet8_piece_1 = extrude(amount=10.330127019, mode=Mode.PRIVATE)
    fillet8_piece_1 = fillet8_piece_1 - Plane(origin=(15, 0, 6), x_dir=(1, 0, 0), z_dir=(0, 0, -1)) * Cylinder(3, 28, mode=Mode.PRIVATE)
    add(fillet8_piece_1, mode=Mode.SUBTRACT)
    with BuildSketch(Plane(origin=(29.330127019, 6, 6), x_dir=(0, 1, 0), z_dir=(-1, 0, 0))) as fillet8_piece_2_section:
        with BuildLine():
            CenterArc((1.732050808, -2), FILLET8_R, 90, 60)
            Line((0, -1), (0, 0))
            Line((0, 0), (1.732050808, 0))
        make_face()
    fillet8_piece_2 = extrude(amount=10.330127019, mode=Mode.PRIVATE)
    fillet8_piece_2 = fillet8_piece_2 - Plane(origin=(25, 10, 6), x_dir=(0, -1, 0), z_dir=(0, 0, -1)) * Cylinder(3, 28, mode=Mode.PRIVATE)
    add(fillet8_piece_2, mode=Mode.SUBTRACT)
    with BuildSketch(Plane(origin=(25, 6, 6), x_dir=(0, 1, 0), z_dir=(-1, 0, 0))) as fillet8_piece_3a_section:
        with BuildLine():
            CenterArc((1.732050808, -2), FILLET8_R, 90, 60)
            Line((0, -1), (0, 0))
            Line((0, 0), (1.732050808, 0))
        make_face()
    fillet8_piece_3a = extrude(amount=10.330127019, mode=Mode.PRIVATE)
    fillet8_piece_3a = split(fillet8_piece_3a, bisect_by=Plane(origin=(19, 6, 6), z_dir=(-1, 0, 0)), keep=Keep.TOP, mode=Mode.PRIVATE)
    with BuildSketch(Plane(origin=(19, 10.330127019, 6), x_dir=(-1, 0, 0), z_dir=(0, -1, 0))) as fillet8_piece_3b_section:
        with BuildLine():
            CenterArc((1.732050808, -2), FILLET8_R, 90, 60)
            Line((0, -1), (0, 0))
            Line((0, 0), (1.732050808, 0))
        make_face()
    fillet8_piece_3b = extrude(amount=10.330127019, mode=Mode.PRIVATE)
    fillet8_piece_3b = split(fillet8_piece_3b, bisect_by=Plane(origin=(19, 6, 6), z_dir=(0, 1, 0)), keep=Keep.TOP, mode=Mode.PRIVATE)
    fillet8_piece_3 = fillet8_piece_3a & fillet8_piece_3b
    add(fillet8_piece_3, mode=Mode.SUBTRACT)

    # Sketch48 → Boss-Extrude9 (add)
    with BuildSketch(Plane.XY.offset(-7.28)):
        with BuildLine():
            Line((10.3, 10.5), (10.3, 23.5))
            Line((10.3, 23.5), (14.5, 23.5))
            Line((14.5, 23.5), (14.5, 13.184339966))
            ThreePointArc((14.5, 13.184339966), (12.8103313, 12.1896687), (11.815660034, 10.5))
            Line((11.815660034, 10.5), (10.3, 10.5))
        make_face()
    extrude(amount=BOSS_EXTRUDE9_DEPTH)

    # Sketch49 → Boss-Extrude10 (add)
    with BuildSketch(Plane.XY.offset(1.5)):
        with Locations((12.4, 17)):
            Rectangle(SKETCH49_W, SKETCH49_H)
    extrude(amount=BOSS_EXTRUDE10_DEPTH)

    # Sketch50 → Boss-Extrude11 (add)
    with BuildSketch(Plane(origin=(0, 2.5, 0), x_dir=(1, 0, 0), z_dir=(0, 1, 0))):
        with Locations((-19.5, 19.5)):
            Rectangle(SKETCH50_W, SKETCH50_H)
        with Locations((-19.5, -19.5)):
            Rectangle(SKETCH50_W, SKETCH50_H)
        with Locations((19.5, 19.5)):
            Rectangle(SKETCH50_W, SKETCH50_H)
        with Locations((19.5, -19.5)):
            Rectangle(SKETCH50_W, SKETCH50_H)
    extrude(amount=BOSS_EXTRUDE11_DEPTH)

    # M1.6 Tapped Hole1
    with Locations(Plane(origin=(0, 38, 0), x_dir=(1, 0, 0), z_dir=(0, 1, 0))):
        with Locations((-20, -20), (-20, 20), (20, 20), (20, -20)):
            Hole(M1_6_TAPPED_HOLE1_D / 2, depth=M1_6_TAPPED_HOLE1_DEPTH)
            with Locations((0, 0, -(M1_6_TAPPED_HOLE1_DEPTH + M1_6_TAPPED_HOLE1_TIP / 2))):  # 118° drill point
                Cone(0, M1_6_TAPPED_HOLE1_D / 2, M1_6_TAPPED_HOLE1_TIP, mode=Mode.SUBTRACT)


solid = part.part
